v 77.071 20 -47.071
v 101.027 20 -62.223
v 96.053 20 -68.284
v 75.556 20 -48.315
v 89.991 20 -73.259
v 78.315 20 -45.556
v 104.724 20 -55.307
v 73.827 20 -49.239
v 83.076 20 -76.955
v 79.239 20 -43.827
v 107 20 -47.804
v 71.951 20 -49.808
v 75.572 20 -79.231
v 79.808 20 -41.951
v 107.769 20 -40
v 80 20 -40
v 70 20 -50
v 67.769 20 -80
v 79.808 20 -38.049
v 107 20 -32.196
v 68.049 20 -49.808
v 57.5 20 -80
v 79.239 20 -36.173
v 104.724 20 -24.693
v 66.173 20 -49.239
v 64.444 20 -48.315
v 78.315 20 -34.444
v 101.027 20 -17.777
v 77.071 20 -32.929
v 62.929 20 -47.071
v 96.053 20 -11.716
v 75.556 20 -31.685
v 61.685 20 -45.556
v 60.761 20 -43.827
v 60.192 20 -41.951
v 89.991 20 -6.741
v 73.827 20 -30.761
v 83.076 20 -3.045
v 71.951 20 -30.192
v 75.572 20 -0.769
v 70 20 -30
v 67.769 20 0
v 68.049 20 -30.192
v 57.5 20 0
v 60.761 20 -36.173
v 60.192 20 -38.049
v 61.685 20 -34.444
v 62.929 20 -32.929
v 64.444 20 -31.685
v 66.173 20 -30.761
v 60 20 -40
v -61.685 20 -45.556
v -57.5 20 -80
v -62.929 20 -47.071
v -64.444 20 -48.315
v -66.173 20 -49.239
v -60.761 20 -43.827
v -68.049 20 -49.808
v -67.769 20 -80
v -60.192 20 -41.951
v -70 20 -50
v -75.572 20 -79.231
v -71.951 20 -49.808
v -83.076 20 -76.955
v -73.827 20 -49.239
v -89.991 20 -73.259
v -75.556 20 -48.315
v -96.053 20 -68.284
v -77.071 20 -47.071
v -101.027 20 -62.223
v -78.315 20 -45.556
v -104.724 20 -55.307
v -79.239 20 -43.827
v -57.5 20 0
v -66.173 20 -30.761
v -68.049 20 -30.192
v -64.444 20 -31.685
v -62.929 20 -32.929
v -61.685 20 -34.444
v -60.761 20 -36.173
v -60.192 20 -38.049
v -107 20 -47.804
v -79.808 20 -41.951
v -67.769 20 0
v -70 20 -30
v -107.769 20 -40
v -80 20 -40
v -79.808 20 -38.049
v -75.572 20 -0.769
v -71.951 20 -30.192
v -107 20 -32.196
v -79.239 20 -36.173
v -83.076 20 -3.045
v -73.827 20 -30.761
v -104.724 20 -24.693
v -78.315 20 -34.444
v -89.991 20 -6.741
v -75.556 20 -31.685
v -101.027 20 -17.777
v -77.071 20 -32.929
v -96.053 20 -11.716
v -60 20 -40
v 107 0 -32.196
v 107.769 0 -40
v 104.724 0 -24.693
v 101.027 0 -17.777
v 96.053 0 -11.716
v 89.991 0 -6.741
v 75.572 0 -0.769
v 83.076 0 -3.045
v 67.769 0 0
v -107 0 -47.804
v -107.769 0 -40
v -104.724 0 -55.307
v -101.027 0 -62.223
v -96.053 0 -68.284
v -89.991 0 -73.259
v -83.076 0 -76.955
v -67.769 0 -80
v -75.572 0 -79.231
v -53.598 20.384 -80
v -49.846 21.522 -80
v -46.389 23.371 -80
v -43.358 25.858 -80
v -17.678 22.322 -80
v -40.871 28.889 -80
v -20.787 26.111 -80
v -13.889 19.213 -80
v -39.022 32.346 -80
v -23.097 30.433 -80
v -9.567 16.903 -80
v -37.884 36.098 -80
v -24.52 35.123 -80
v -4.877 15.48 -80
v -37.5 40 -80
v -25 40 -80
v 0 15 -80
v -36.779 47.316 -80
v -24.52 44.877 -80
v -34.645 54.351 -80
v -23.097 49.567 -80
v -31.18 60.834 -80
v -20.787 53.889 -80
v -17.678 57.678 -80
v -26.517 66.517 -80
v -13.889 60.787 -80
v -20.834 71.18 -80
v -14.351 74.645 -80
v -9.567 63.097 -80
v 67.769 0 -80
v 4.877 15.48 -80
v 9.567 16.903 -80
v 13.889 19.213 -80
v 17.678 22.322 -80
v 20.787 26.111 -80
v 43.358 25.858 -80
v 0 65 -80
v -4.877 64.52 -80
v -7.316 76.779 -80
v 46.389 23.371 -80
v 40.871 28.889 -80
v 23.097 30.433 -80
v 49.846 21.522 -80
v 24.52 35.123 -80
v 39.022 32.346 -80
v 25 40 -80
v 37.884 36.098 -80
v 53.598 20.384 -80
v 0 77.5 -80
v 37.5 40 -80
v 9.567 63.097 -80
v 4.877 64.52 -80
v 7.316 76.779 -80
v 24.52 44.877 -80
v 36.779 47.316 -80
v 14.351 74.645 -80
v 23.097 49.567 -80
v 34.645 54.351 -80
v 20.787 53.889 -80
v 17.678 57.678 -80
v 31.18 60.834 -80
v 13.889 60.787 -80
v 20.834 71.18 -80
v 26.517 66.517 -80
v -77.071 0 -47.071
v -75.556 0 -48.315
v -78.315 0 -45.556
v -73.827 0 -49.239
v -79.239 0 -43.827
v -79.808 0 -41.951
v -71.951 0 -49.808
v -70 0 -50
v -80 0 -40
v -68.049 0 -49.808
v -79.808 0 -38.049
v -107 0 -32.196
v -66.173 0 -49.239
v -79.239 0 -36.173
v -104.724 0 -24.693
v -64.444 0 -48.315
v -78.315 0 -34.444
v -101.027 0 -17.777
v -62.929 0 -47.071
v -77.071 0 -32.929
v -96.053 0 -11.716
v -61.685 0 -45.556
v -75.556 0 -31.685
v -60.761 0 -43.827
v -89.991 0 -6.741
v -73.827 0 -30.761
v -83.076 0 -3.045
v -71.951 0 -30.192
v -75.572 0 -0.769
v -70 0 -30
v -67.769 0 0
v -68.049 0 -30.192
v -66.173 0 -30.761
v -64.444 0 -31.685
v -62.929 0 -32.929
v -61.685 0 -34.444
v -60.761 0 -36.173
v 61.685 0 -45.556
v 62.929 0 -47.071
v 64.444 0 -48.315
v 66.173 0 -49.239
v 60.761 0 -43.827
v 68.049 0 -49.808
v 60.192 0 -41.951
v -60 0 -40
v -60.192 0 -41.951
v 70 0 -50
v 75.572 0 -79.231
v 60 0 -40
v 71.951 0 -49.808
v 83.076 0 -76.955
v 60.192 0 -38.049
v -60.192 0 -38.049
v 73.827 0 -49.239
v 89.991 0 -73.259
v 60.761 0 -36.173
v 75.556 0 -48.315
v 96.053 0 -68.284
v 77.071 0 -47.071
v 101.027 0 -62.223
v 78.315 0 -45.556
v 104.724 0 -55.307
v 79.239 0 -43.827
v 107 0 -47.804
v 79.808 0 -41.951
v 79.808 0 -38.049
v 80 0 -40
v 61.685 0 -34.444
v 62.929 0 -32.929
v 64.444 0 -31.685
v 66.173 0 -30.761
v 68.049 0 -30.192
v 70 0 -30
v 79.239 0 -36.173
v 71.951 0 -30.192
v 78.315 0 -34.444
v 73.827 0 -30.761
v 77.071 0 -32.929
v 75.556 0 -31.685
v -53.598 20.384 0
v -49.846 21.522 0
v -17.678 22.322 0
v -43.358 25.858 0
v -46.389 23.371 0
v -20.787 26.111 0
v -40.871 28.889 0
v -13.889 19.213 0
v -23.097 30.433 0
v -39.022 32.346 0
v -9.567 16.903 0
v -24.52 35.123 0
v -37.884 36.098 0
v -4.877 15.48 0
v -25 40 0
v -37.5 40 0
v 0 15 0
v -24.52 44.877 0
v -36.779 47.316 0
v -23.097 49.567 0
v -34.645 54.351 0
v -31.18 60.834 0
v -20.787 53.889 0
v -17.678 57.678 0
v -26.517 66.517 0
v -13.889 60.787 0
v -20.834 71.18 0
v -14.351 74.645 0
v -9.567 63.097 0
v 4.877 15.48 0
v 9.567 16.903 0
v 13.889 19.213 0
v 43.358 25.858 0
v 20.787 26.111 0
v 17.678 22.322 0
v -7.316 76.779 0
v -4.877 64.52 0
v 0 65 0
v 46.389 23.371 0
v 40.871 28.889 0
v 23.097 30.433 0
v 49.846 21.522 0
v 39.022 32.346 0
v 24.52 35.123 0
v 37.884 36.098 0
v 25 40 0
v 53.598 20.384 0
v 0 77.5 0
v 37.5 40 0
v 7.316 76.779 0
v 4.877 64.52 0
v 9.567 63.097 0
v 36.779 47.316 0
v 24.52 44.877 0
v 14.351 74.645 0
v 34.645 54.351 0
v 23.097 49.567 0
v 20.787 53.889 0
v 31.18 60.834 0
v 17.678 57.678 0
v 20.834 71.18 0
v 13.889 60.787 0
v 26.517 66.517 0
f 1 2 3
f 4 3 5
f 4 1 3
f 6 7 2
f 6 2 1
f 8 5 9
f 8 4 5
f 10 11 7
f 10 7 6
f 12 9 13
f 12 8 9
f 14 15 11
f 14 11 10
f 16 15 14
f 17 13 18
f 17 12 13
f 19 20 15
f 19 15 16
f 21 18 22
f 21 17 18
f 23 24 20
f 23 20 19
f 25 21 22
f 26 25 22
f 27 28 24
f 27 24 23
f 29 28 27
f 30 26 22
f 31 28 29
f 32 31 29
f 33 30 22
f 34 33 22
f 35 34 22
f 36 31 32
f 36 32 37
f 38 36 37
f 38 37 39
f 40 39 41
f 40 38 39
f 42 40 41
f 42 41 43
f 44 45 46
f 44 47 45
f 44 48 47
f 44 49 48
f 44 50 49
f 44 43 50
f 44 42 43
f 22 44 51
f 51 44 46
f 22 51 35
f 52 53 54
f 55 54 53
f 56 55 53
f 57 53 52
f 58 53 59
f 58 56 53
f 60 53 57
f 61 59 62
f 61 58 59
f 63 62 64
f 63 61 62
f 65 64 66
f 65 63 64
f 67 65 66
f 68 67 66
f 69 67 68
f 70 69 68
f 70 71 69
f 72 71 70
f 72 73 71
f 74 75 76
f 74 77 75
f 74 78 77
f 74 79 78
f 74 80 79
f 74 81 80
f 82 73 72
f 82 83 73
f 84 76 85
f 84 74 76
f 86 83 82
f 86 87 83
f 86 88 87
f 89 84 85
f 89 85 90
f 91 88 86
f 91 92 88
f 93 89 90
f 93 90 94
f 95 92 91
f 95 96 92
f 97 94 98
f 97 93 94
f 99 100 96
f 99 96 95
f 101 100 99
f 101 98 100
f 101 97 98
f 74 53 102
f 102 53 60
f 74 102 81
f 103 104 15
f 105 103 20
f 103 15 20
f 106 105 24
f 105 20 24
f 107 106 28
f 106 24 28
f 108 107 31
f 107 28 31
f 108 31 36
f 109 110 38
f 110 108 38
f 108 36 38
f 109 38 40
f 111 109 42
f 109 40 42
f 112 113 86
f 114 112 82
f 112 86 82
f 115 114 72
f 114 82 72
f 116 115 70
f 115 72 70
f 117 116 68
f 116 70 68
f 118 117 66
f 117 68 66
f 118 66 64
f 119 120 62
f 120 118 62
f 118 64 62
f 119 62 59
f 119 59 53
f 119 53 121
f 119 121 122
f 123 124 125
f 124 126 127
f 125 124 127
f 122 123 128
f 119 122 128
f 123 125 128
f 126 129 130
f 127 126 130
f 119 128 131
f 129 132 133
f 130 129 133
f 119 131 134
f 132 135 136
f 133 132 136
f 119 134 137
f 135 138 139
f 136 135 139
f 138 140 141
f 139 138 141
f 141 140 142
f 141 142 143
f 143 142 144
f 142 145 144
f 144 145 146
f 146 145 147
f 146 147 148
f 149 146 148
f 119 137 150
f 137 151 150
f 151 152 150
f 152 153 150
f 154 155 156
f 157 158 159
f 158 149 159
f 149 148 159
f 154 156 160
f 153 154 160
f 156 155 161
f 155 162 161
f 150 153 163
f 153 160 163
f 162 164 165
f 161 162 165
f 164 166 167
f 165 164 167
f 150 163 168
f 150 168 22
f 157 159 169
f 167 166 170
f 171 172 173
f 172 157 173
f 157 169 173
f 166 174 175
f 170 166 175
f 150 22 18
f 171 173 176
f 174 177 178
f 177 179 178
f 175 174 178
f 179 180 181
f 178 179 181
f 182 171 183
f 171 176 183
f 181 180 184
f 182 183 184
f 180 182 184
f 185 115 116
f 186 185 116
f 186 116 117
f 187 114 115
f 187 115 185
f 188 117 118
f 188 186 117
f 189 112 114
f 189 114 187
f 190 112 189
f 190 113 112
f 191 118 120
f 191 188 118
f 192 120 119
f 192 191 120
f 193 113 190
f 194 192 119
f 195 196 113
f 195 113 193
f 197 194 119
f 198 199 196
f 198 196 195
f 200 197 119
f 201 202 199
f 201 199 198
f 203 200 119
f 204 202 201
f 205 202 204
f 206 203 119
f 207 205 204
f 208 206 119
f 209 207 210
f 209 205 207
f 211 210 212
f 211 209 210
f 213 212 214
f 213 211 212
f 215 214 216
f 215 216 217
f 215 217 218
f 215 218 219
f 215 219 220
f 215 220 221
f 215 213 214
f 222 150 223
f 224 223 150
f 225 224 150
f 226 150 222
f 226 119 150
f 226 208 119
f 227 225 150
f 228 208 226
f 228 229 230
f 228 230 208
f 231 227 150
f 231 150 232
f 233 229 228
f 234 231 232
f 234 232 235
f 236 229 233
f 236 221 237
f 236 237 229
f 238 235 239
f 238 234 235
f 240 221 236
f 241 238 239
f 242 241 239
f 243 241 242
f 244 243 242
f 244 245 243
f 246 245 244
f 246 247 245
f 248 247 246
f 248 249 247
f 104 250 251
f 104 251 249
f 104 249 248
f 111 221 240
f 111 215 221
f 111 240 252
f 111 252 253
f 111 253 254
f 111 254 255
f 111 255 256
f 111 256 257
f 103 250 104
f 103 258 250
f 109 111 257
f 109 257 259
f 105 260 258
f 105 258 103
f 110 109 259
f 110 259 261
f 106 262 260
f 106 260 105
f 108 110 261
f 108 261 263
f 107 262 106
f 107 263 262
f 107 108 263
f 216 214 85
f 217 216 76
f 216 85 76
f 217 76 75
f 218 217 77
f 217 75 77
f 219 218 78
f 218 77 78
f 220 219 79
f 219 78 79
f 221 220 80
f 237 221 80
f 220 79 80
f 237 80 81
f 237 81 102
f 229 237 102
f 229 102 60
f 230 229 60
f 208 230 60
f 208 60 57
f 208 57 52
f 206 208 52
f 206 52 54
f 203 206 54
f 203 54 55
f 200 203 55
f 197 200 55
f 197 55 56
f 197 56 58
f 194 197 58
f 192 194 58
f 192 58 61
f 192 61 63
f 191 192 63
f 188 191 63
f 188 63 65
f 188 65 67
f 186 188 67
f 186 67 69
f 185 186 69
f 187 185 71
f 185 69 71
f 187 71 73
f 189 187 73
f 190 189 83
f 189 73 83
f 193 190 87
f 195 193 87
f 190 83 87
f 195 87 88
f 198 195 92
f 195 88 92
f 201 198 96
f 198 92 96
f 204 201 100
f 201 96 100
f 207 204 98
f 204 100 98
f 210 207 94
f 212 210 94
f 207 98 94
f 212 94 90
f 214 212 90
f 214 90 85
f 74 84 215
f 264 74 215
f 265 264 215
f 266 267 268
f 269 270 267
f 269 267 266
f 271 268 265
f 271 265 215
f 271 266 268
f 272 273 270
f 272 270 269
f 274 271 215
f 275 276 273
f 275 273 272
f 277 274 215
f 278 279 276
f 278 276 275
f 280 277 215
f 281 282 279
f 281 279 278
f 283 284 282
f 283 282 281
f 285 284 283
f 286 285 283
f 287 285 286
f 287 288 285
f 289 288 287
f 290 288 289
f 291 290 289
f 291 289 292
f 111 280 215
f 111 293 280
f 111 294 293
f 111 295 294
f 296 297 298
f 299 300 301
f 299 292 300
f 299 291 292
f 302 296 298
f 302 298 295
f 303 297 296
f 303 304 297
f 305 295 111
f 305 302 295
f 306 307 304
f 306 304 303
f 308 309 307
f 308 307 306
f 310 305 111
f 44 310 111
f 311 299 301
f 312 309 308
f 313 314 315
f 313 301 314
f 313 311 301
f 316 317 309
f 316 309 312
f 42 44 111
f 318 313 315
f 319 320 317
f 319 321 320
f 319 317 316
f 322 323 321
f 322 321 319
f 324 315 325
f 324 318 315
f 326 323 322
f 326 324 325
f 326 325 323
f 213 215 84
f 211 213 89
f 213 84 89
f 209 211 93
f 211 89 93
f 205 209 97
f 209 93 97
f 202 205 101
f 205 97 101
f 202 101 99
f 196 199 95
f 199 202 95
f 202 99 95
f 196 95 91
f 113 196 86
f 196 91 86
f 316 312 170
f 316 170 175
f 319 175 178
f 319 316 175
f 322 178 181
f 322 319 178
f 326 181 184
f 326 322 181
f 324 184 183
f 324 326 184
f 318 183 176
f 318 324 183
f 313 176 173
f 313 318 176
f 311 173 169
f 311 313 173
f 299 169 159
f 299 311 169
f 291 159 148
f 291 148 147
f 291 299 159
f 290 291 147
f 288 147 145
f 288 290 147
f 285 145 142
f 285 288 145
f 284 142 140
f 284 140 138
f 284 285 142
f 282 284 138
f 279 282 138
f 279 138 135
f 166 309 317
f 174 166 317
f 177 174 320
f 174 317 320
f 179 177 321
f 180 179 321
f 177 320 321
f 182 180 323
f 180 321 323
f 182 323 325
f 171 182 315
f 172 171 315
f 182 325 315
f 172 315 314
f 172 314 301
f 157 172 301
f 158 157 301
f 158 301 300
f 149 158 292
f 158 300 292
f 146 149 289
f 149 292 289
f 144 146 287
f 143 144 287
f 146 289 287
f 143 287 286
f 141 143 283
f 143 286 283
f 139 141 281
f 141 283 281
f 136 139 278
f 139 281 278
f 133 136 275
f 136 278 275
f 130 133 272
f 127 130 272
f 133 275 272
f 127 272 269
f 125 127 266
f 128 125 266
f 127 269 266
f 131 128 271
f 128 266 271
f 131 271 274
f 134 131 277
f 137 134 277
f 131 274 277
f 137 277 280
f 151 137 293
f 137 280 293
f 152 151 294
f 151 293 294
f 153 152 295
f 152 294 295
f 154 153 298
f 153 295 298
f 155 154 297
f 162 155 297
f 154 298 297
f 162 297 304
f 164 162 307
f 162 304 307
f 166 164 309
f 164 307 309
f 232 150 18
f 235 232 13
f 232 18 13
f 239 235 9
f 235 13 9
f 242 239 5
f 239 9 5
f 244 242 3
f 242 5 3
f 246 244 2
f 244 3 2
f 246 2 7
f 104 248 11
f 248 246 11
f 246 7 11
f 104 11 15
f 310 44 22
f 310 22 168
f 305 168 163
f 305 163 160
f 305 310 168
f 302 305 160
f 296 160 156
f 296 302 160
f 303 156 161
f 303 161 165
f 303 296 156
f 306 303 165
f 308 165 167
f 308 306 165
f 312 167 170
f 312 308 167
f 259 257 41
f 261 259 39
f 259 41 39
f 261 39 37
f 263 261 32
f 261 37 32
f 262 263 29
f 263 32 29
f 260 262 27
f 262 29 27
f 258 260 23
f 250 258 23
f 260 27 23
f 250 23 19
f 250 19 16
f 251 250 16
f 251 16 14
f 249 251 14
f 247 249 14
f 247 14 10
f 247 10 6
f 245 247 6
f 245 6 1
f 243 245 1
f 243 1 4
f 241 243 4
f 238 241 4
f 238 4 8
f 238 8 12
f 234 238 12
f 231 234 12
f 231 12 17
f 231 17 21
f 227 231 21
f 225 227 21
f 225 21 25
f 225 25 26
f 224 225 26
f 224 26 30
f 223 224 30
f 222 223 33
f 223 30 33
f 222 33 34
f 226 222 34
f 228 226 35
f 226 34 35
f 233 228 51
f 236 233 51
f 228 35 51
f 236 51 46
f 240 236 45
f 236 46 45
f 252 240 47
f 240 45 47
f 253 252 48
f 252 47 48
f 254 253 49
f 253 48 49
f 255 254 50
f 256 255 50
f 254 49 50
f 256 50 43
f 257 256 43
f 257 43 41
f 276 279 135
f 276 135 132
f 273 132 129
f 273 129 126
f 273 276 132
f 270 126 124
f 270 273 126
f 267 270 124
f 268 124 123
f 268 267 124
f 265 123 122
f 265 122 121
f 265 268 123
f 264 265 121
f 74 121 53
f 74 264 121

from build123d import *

# Parameters (mm, degrees)
SKETCH1_R           = 25
BOSS_EXTRUDE1_DEPTH = 80
CUT_EXTRUDE1_DEPTH  = 80
SKETCH3_R           = 10
CUT_EXTRUDE2_DEPTH  = 80


with BuildPart() as part:
    # Sketch1 → Boss-Extrude1 (new body)
    with BuildSketch(Plane.XY):
        with BuildLine():
            Line((-107.76864352, 0), (107.76864352, 0))
            Line((107.76864352, 0), (107.76864352, 20))
            Line((107.76864352, 20), (57.5, 20))
            ThreePointArc((57.5, 20), (43.357864376, 25.857864376), (37.5, 40))
            ThreePointArc((37.5, 40), (0, 77.5), (-37.5, 40))
            ThreePointArc((-37.5, 40), (-43.357864376, 25.857864376), (-57.5, 20))
            Line((-57.5, 20), (-107.76864352, 20))
            Line((-107.76864352, 20), (-107.76864352, 0))
        make_face()
        with Locations((0, 40)):
            Circle(SKETCH1_R, mode=Mode.SUBTRACT)
    extrude(amount=-BOSS_EXTRUDE1_DEPTH)

    # Sketch2 → Cut-Extrude1 (cut)
    with BuildSketch(Plane(origin=(0, 20, 0), x_dir=(1, 0, 0), z_dir=(0, 1, 0))):
        with BuildLine():
            Line((-107.76864352, 0), (-67.76864352, 0))
            ThreePointArc((-67.76864352, 0), (-96.052914767, 11.715728753), (-107.76864352, 40))
            Line((-107.76864352, 40), (-107.76864352, 0))
        make_face()
        with BuildLine():
            ThreePointArc((-107.76864352, 40), (-96.052914767, 68.284271247), (-67.76864352, 80))
            Line((-67.76864352, 80), (-107.76864352, 80))
            Line((-107.76864352, 80), (-107.76864352, 40))
        make_face()
        with BuildLine():
            ThreePointArc((107.76864352, 40), (96.052914767, 11.715728753), (67.76864352, 0))
            Line((67.76864352, 0), (107.76864352, 0))
            Line((107.76864352, 0), (107.76864352, 40))
        make_face()
        with BuildLine():
            Line((107.76864352, 80), (67.76864352, 80))
            ThreePointArc((67.76864352, 80), (96.052914767, 68.284271247), (107.76864352, 40))
            Line((107.76864352, 40), (107.76864352, 80))
        make_face()
    extrude(amount=-CUT_EXTRUDE1_DEPTH, mode=Mode.SUBTRACT)

    # Sketch3 → Cut-Extrude2 (cut)
    with BuildSketch(Plane(origin=(0, 20, 0), x_dir=(1, 0, 0), z_dir=(0, 1, 0))):
        with Locations(Location((70, 40, 0), (0, 0, 270))):
            Circle(SKETCH3_R)
        with Locations(Location((-70, 40, 0), (0, 0, 270))):
            Circle(SKETCH3_R)
    extrude(amount=-CUT_EXTRUDE2_DEPTH, mode=Mode.SUBTRACT)


solid = part.part
